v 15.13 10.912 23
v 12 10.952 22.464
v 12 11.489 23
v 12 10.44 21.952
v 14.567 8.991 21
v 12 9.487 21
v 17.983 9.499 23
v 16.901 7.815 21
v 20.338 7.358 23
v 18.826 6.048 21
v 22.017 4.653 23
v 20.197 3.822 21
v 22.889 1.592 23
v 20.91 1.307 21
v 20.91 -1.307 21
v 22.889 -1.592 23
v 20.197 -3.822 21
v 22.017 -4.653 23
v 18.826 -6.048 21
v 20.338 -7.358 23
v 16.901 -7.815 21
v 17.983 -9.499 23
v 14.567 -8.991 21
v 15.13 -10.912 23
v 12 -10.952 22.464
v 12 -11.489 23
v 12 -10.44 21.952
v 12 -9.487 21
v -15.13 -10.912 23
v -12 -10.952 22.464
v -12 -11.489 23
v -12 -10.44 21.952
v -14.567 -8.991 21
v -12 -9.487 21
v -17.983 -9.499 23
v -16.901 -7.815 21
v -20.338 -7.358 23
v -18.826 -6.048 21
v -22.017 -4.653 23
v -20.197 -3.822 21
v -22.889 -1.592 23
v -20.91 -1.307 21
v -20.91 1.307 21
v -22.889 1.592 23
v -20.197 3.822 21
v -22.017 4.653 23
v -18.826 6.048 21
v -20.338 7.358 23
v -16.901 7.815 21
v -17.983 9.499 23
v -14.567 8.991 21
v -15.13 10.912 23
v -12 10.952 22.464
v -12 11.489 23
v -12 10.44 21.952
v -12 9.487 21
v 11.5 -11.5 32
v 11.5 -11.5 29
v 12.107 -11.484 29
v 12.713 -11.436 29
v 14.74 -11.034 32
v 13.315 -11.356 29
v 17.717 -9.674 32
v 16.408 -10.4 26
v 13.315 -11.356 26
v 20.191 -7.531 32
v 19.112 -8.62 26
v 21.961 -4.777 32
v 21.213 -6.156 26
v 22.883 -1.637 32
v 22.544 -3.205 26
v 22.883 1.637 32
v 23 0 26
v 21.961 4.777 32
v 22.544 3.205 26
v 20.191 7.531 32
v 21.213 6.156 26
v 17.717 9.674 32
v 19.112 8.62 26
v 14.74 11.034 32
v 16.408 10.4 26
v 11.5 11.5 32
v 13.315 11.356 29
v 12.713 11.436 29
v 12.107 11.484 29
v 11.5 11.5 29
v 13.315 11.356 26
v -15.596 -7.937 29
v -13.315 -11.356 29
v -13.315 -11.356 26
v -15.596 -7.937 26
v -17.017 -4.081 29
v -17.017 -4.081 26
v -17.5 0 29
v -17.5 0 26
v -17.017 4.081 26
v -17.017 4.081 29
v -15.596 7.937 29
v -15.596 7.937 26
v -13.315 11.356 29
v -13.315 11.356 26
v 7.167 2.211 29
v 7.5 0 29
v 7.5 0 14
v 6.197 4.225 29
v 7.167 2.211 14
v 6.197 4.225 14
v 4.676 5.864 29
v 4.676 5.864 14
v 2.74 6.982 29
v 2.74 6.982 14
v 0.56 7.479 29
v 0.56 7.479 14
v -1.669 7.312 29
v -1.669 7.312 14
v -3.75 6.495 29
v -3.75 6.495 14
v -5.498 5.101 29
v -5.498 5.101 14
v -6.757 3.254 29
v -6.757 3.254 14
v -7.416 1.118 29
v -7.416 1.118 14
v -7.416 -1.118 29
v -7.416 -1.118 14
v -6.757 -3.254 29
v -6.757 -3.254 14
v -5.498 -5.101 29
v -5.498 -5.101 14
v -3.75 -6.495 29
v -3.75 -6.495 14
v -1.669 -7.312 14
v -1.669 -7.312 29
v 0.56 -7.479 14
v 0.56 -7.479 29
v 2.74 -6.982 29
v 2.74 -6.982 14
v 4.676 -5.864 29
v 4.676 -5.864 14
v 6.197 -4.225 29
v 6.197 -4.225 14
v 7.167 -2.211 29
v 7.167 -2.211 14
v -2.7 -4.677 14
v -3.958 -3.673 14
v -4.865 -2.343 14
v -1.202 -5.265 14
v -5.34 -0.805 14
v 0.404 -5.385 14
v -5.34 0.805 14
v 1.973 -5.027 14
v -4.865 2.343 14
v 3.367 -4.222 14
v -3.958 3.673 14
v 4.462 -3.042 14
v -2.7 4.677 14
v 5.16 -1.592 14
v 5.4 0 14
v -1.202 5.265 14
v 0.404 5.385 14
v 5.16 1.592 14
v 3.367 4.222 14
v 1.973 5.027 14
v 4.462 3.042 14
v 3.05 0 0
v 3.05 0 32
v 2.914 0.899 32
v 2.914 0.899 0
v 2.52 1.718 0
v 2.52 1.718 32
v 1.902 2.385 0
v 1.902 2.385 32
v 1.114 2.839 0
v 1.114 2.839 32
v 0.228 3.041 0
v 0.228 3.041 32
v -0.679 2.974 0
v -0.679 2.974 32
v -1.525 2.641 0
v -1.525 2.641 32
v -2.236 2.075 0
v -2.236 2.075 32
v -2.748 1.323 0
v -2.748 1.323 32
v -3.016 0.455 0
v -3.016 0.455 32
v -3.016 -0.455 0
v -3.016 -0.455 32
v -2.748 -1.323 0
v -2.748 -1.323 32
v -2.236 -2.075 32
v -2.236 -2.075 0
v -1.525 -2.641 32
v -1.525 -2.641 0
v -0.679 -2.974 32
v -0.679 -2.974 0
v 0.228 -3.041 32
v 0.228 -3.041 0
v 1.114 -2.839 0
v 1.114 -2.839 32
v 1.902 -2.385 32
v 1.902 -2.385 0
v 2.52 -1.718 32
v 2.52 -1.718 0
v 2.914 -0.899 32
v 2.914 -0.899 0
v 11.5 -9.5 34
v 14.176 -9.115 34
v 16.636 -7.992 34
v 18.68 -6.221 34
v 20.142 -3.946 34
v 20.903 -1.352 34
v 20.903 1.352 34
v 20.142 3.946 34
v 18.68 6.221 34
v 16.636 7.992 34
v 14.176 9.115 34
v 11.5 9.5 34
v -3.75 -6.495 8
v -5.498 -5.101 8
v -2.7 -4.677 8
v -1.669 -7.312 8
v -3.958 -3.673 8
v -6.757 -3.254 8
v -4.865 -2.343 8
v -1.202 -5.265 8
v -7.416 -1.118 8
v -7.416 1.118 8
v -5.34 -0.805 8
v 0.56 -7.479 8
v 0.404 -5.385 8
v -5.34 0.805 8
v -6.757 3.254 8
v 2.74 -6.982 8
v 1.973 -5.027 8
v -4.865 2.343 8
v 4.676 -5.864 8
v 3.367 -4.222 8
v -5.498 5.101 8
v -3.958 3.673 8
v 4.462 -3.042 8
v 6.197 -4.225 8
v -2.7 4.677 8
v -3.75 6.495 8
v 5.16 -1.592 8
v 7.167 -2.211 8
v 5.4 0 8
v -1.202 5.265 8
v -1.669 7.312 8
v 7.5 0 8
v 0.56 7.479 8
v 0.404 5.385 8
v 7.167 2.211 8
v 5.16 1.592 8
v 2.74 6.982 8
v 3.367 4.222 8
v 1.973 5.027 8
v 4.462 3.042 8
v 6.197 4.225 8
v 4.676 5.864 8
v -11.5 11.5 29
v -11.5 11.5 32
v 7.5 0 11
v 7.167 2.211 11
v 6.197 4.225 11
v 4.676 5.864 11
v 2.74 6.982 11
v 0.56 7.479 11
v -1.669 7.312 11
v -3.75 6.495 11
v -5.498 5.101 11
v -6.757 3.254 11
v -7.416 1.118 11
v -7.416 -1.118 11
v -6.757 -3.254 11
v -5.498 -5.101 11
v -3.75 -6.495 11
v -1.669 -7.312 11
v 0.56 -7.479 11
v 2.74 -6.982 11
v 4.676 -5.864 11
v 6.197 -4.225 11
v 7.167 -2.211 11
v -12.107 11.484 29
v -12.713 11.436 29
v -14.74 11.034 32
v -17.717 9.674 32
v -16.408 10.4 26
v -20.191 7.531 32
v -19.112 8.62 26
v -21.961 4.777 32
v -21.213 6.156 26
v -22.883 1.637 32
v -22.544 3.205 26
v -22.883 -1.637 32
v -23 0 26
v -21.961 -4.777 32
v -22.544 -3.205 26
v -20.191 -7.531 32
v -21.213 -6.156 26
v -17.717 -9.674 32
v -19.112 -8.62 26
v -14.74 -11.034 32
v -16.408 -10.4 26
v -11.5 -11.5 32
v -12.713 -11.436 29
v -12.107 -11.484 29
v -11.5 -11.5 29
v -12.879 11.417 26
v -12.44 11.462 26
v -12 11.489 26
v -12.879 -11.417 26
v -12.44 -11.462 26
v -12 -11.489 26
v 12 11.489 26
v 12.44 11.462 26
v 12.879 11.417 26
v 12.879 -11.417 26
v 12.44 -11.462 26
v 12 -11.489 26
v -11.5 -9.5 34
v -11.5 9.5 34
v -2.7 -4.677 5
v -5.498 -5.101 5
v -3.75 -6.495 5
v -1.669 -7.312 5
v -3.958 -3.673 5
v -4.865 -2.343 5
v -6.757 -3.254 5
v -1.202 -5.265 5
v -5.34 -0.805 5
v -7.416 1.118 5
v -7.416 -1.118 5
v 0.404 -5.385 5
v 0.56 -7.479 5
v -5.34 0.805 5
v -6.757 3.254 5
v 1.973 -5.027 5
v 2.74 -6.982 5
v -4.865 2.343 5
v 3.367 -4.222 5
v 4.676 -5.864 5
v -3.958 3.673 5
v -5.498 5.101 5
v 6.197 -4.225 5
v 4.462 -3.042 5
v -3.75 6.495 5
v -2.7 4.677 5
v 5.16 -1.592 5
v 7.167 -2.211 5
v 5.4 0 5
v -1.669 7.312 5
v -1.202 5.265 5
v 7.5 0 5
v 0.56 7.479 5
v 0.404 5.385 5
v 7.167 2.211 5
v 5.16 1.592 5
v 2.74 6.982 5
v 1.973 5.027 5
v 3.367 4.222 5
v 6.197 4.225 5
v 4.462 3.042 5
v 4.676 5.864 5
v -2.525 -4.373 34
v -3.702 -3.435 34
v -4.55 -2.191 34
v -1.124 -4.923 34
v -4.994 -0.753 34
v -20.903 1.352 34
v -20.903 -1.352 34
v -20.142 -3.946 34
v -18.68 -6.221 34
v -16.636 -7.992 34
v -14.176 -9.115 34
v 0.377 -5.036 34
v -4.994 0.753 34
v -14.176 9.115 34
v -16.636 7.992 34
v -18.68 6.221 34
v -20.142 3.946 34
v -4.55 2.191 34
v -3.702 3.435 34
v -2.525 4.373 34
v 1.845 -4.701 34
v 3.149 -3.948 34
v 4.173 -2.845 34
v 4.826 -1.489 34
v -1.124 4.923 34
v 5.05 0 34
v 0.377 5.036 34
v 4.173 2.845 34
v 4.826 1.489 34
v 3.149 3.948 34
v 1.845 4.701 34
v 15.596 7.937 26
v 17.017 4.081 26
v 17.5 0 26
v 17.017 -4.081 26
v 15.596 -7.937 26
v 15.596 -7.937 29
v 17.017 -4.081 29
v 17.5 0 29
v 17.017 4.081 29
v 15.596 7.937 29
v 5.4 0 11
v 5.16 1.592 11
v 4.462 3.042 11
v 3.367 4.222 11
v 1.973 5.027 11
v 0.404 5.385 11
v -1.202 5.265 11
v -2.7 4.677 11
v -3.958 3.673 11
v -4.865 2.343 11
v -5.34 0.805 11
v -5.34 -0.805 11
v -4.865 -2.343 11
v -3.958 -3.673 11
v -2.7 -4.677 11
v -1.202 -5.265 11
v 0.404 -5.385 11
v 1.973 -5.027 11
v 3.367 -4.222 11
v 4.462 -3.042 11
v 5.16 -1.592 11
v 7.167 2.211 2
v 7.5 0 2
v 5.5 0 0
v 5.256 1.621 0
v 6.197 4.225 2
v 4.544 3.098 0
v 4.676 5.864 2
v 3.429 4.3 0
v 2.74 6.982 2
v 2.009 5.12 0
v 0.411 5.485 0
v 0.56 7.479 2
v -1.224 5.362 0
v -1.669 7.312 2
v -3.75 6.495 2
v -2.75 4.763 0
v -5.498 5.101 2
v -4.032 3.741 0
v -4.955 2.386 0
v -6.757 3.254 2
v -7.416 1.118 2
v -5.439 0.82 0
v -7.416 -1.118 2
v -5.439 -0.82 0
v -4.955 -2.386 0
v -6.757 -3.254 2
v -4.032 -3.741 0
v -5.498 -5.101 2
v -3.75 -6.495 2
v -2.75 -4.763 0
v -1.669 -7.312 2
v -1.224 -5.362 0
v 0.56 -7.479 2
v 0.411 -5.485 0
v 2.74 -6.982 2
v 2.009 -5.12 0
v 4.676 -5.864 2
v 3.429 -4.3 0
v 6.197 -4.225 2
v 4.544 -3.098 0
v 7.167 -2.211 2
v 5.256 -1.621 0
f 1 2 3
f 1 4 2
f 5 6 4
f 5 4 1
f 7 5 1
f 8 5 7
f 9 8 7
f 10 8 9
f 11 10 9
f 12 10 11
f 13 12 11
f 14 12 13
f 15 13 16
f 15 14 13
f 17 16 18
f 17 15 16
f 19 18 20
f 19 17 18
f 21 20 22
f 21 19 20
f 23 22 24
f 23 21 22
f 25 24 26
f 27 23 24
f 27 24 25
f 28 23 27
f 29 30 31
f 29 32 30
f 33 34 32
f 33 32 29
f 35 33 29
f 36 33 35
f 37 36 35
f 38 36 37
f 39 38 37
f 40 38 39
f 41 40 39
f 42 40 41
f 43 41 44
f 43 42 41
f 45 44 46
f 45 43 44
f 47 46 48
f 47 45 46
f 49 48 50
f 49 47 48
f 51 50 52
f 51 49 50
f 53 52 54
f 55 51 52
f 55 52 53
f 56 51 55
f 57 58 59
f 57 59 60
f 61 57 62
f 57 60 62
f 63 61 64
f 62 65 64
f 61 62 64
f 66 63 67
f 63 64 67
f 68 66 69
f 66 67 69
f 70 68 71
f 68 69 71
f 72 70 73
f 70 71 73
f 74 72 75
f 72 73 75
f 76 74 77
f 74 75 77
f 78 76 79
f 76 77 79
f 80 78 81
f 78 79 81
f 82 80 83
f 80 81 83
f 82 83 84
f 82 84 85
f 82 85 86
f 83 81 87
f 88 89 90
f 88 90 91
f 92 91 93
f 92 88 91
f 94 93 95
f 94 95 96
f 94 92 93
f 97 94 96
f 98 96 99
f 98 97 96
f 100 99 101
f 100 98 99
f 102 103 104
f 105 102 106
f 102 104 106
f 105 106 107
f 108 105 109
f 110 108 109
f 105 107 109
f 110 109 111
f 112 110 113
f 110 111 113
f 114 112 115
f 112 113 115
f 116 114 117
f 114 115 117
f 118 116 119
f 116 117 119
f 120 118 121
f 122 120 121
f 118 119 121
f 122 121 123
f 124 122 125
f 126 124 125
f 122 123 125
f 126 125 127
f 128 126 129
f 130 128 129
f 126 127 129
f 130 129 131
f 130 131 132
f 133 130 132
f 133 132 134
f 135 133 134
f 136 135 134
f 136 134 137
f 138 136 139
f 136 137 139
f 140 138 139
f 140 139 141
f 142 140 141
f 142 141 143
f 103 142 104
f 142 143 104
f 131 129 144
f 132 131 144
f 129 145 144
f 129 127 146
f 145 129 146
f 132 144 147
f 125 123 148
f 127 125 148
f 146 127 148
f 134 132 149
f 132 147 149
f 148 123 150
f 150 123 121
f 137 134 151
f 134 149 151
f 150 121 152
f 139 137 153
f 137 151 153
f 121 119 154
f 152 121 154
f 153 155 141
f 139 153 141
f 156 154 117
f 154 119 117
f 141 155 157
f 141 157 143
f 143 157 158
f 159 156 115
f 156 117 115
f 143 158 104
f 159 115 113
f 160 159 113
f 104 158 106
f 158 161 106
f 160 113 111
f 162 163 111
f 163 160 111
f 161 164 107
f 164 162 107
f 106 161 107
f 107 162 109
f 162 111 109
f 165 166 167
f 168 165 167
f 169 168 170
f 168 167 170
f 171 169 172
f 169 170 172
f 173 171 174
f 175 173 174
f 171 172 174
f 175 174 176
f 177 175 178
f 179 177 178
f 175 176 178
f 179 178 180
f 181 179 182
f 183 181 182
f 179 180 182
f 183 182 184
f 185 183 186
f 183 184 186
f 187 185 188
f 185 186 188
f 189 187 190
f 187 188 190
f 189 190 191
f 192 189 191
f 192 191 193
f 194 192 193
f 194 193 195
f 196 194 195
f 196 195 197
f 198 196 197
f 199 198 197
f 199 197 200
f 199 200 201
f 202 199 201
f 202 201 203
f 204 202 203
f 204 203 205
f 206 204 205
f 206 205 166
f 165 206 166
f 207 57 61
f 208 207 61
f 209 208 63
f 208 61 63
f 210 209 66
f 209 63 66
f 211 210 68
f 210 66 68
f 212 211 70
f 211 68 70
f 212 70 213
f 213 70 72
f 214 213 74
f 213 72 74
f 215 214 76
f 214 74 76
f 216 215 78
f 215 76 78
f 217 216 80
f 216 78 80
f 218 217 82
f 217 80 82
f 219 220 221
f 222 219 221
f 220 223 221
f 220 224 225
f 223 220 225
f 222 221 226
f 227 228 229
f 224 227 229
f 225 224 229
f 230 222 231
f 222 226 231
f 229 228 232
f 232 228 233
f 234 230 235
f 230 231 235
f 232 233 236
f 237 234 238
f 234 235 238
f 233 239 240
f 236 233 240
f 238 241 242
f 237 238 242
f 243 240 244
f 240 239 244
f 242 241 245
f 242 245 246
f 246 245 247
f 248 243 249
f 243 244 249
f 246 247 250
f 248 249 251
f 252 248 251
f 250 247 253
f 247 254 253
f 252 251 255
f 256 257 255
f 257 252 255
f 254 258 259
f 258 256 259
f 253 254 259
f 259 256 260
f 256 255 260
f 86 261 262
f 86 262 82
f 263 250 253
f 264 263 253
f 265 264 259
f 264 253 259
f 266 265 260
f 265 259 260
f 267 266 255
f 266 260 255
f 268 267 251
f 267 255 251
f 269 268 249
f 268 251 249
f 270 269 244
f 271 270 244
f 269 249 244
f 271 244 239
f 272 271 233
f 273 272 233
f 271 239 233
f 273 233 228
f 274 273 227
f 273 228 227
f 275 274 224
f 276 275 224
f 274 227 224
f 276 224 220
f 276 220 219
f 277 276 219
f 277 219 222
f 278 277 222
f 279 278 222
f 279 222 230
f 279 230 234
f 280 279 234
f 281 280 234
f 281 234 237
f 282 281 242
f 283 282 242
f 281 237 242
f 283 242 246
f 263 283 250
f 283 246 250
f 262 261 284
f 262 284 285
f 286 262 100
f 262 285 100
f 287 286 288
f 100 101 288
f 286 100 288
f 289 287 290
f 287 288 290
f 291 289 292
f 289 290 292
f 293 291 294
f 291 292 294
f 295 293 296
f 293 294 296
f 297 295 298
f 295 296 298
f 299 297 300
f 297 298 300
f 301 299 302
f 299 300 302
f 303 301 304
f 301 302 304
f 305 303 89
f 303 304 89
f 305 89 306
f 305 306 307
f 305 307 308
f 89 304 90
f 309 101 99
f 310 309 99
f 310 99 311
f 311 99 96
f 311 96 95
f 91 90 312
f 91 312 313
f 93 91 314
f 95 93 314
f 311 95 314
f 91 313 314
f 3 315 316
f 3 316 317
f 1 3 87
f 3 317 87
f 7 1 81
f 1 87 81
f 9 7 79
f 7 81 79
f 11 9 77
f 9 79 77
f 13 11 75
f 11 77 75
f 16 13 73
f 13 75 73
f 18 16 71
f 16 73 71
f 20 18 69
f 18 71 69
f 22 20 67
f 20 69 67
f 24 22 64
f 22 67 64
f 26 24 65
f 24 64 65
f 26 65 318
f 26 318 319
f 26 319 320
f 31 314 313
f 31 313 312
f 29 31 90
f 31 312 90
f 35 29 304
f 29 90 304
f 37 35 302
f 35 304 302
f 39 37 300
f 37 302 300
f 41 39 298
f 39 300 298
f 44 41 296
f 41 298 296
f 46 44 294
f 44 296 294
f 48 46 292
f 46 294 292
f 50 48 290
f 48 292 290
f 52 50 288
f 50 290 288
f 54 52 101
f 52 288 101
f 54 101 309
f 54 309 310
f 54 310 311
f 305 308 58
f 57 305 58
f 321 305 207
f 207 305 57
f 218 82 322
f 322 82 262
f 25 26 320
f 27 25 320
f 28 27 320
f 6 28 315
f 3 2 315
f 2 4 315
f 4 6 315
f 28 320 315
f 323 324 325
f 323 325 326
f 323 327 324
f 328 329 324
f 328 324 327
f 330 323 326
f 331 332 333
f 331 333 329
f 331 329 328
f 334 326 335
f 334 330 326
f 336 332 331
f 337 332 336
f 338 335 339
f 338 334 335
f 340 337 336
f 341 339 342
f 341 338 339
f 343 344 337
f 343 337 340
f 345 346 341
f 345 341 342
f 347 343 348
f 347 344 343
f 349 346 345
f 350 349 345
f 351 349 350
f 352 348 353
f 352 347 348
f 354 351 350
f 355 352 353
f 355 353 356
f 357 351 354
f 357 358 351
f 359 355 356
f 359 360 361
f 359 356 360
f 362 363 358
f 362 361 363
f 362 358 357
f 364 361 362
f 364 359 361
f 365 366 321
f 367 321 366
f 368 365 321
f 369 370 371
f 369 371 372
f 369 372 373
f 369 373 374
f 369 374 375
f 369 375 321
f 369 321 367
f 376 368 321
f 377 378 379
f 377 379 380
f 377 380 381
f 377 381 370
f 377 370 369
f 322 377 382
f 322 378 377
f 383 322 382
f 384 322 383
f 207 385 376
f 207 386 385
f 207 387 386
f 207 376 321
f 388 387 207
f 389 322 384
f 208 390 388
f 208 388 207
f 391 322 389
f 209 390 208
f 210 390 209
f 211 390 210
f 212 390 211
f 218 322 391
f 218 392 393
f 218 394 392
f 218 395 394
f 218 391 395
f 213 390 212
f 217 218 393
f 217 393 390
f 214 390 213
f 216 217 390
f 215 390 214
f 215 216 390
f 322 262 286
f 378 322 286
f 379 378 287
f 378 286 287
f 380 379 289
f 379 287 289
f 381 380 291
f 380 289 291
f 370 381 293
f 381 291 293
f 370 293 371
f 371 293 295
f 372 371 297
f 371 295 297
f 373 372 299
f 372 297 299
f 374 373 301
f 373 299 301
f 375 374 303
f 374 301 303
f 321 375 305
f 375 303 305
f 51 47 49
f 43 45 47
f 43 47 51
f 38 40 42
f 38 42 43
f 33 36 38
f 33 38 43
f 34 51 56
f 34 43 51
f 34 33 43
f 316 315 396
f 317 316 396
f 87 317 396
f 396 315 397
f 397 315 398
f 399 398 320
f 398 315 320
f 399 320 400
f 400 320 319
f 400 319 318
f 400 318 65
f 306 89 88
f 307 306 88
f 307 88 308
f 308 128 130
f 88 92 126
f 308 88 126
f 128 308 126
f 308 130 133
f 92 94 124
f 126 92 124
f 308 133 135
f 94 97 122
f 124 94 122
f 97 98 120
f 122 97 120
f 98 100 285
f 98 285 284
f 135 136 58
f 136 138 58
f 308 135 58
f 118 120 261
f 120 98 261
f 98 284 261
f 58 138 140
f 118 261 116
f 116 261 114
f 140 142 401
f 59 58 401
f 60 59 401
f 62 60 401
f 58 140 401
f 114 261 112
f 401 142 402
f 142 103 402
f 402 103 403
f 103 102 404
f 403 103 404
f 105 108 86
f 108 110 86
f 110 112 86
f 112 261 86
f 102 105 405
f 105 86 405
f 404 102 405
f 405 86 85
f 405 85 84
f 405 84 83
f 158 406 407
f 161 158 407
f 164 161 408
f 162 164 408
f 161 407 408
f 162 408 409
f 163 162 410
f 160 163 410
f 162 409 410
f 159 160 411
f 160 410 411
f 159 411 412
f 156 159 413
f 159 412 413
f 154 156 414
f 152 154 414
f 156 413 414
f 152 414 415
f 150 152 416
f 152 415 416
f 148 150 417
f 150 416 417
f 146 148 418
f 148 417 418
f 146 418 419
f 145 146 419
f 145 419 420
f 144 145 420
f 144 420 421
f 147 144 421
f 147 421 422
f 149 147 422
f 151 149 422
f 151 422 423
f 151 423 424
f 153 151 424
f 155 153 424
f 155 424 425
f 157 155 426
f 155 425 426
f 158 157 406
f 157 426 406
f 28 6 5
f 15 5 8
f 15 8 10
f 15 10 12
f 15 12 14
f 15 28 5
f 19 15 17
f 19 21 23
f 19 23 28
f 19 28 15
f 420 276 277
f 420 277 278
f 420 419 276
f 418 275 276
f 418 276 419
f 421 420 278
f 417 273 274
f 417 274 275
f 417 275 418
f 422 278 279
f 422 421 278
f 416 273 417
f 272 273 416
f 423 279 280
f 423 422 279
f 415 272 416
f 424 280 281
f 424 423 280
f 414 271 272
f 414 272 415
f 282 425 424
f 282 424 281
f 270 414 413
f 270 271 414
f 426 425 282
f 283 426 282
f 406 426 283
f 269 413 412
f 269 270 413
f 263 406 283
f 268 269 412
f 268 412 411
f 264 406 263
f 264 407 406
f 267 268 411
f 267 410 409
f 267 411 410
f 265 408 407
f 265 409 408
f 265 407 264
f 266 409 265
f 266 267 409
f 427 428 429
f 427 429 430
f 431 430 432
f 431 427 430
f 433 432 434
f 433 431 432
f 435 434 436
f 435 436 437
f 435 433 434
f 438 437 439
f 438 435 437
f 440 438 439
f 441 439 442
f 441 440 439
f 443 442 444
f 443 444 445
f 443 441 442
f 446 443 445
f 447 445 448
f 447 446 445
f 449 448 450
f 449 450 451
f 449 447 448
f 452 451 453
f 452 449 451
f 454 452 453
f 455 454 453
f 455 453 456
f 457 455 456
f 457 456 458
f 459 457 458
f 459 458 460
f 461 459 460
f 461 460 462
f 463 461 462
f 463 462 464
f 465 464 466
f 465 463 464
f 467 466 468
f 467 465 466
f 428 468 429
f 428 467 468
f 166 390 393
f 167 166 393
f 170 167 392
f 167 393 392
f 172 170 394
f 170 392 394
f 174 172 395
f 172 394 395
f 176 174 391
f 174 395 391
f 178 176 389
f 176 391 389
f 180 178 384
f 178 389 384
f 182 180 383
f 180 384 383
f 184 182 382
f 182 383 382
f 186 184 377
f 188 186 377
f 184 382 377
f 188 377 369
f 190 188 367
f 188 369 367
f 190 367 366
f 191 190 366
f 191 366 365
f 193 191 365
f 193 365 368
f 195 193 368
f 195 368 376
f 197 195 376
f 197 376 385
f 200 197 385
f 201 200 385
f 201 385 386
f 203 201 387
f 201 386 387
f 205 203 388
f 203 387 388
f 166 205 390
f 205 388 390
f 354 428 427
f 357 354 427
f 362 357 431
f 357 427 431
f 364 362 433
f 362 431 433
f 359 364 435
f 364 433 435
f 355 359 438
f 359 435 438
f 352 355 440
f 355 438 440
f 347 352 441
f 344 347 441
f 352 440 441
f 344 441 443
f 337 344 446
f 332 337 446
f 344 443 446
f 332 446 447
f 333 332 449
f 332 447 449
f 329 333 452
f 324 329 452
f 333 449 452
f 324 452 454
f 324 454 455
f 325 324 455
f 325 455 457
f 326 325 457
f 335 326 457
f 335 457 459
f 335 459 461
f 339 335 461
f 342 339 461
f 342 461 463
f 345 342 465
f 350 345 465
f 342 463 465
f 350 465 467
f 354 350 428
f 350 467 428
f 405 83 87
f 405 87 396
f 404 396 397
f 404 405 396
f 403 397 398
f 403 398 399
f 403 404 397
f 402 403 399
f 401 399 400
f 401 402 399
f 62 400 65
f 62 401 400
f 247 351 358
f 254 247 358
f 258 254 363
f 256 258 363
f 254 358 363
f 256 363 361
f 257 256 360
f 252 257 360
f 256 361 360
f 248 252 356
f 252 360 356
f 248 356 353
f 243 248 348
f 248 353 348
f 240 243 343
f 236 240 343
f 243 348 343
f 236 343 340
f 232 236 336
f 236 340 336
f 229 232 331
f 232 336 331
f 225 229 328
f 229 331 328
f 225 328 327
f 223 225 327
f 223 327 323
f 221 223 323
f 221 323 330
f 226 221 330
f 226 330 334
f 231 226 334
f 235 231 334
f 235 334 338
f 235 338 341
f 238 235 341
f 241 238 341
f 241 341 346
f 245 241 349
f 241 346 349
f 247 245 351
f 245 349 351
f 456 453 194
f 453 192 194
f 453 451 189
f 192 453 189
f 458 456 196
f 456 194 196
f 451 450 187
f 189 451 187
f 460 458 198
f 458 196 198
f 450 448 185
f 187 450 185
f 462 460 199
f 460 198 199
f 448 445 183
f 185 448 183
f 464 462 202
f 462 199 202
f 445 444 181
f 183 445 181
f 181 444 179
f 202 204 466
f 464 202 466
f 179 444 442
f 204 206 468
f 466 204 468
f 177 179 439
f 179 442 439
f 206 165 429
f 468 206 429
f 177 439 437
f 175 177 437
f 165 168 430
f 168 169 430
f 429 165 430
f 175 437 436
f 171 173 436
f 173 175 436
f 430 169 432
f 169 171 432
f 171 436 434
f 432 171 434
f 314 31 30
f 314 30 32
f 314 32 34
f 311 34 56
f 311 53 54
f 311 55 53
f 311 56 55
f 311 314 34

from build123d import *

# Parameters (mm, degrees)
SKETCH_R        = 7.5
PAD_DEPTH       = 5
SKETCH001_R     = 5.4
PAD001_DEPTH    = 3
SKETCH002_R     = 7.5
PAD002_DEPTH    = 3
SKETCH003_R     = 5.4
PAD003_DEPTH    = 3
SKETCH004_R     = 7.5
PAD004_DEPTH    = 15
PAD005_DEPTH    = 5
PAD006_DEPTH    = 3
PAD007_DEPTH    = 5
SKETCH008_R     = 3.05
POCKET_DEPTH    = 34.001
CHAMFER_SIZE    = 2
CHAMFER001_SIZE = 2
CHAMFER002_SIZE = 2
CHAMFER003_SIZE = 2


with BuildPart() as part:
    # Sketch → Pad (new body)
    with BuildSketch(Plane.XY):
        Circle(SKETCH_R)
    extrude(amount=PAD_DEPTH)

    # Sketch001 (on Face3 of Pad) → Pad001 (join)
    with BuildSketch(Plane.XY.offset(5)):
        Circle(SKETCH001_R)
    extrude(amount=PAD001_DEPTH)

    # Sketch002 (on Face5 of Pad001) → Pad002 (join)
    with BuildSketch(Plane.XY.offset(8)):
        Circle(SKETCH002_R)
    extrude(amount=PAD002_DEPTH)

    # Sketch003 (on Face3 of Pad002) → Pad003 (join)
    with BuildSketch(Plane.XY.offset(11)):
        Circle(SKETCH003_R)
    extrude(amount=PAD003_DEPTH)

    # Sketch004 (on Face7 of Pad003) → Pad004 (join)
    with BuildSketch(Plane.XY.offset(14)):
        Circle(SKETCH004_R)
    extrude(amount=PAD004_DEPTH)

    # Sketch005 (on Face3 of Pad004) → Pad005 (join)
    with BuildSketch(Plane.XY.offset(29)):
        with BuildLine():
            ThreePointArc((-11.5, 11.5), (-23, 0), (-11.5, -11.5))
            Line((-11.5, -11.5), (11.5, -11.5))
            ThreePointArc((11.5, -11.5), (23, 0), (11.5, 11.5))
            Line((-11.5, 11.5), (11.5, 11.5))
        make_face()
    extrude(amount=PAD005_DEPTH)

    # Sketch006 (on Face4 of Pad005) → Pad006 (join)
    with BuildSketch(Plane(origin=(0, 0, 29), x_dir=(1, 0, 0), z_dir=(0, 0, -1))):
        with BuildLine():
            ThreePointArc((13.315217, -11.355835), (23, 0), (13.315217, 11.355835))
            ThreePointArc((13.315217, -11.355835), (17.5, 0), (13.315217, 11.355835))
        make_face()
        with BuildLine():
            ThreePointArc((-13.315217, 11.355835), (-23, 0), (-13.315217, -11.355835))
            ThreePointArc((-13.315217, 11.355835), (-17.5, 0), (-13.315217, -11.355835))
        make_face()
    extrude(amount=PAD006_DEPTH)

    # Sketch007 (on Face13 of Pad006) → Pad007 (join)
    with BuildSketch(Plane(origin=(0, 0, 26), x_dir=(1, 0, 0), z_dir=(0, 0, -1))):
        with BuildLine():
            ThreePointArc((-12, 11.489125), (-23, 0), (-12, -11.489125))
            Line((-12, 11.489125), (-12, -11.489125))
        make_face()
        with BuildLine():
            Line((12, 11.489125), (12, -11.489125))
            ThreePointArc((12, -11.489125), (23, 0), (12, 11.489125))
        make_face()
    extrude(amount=PAD007_DEPTH)

    # Sketch008 → Pocket (cut, through all)
    with BuildSketch(Plane.XY.offset(34)):
        Circle(SKETCH008_R)
    extrude(amount=-POCKET_DEPTH, mode=Mode.SUBTRACT)

    # Chamfer
    chamfer_edges = [part.edges().sort_by_distance(p)[0] for p in [
        (23, 0, 21),
    ]]
    chamfer(chamfer_edges, length=CHAMFER_SIZE)

    # Chamfer001
    chamfer001_edges = [part.edges().sort_by_distance(p)[0] for p in [
        (-23, 0, 21),
    ]]
    chamfer(chamfer001_edges, length=CHAMFER001_SIZE)

    # Chamfer002
    chamfer002_edges = [part.edges().sort_by_distance(p)[0] for p in [
        (-7.5, 0, 0),
    ]]
    chamfer(chamfer002_edges, length=CHAMFER002_SIZE)

    # Chamfer003
    chamfer003_edges = [part.edges().sort_by_distance(p)[0] for p in [
        (-23, 0, 34),
        (0, 11.5, 34),
        (0, -11.5, 34),
        (23, 0, 34),
        (-3.05, 0, 34),
    ]]
    chamfer(chamfer003_edges, length=CHAMFER003_SIZE)


solid = part.part
